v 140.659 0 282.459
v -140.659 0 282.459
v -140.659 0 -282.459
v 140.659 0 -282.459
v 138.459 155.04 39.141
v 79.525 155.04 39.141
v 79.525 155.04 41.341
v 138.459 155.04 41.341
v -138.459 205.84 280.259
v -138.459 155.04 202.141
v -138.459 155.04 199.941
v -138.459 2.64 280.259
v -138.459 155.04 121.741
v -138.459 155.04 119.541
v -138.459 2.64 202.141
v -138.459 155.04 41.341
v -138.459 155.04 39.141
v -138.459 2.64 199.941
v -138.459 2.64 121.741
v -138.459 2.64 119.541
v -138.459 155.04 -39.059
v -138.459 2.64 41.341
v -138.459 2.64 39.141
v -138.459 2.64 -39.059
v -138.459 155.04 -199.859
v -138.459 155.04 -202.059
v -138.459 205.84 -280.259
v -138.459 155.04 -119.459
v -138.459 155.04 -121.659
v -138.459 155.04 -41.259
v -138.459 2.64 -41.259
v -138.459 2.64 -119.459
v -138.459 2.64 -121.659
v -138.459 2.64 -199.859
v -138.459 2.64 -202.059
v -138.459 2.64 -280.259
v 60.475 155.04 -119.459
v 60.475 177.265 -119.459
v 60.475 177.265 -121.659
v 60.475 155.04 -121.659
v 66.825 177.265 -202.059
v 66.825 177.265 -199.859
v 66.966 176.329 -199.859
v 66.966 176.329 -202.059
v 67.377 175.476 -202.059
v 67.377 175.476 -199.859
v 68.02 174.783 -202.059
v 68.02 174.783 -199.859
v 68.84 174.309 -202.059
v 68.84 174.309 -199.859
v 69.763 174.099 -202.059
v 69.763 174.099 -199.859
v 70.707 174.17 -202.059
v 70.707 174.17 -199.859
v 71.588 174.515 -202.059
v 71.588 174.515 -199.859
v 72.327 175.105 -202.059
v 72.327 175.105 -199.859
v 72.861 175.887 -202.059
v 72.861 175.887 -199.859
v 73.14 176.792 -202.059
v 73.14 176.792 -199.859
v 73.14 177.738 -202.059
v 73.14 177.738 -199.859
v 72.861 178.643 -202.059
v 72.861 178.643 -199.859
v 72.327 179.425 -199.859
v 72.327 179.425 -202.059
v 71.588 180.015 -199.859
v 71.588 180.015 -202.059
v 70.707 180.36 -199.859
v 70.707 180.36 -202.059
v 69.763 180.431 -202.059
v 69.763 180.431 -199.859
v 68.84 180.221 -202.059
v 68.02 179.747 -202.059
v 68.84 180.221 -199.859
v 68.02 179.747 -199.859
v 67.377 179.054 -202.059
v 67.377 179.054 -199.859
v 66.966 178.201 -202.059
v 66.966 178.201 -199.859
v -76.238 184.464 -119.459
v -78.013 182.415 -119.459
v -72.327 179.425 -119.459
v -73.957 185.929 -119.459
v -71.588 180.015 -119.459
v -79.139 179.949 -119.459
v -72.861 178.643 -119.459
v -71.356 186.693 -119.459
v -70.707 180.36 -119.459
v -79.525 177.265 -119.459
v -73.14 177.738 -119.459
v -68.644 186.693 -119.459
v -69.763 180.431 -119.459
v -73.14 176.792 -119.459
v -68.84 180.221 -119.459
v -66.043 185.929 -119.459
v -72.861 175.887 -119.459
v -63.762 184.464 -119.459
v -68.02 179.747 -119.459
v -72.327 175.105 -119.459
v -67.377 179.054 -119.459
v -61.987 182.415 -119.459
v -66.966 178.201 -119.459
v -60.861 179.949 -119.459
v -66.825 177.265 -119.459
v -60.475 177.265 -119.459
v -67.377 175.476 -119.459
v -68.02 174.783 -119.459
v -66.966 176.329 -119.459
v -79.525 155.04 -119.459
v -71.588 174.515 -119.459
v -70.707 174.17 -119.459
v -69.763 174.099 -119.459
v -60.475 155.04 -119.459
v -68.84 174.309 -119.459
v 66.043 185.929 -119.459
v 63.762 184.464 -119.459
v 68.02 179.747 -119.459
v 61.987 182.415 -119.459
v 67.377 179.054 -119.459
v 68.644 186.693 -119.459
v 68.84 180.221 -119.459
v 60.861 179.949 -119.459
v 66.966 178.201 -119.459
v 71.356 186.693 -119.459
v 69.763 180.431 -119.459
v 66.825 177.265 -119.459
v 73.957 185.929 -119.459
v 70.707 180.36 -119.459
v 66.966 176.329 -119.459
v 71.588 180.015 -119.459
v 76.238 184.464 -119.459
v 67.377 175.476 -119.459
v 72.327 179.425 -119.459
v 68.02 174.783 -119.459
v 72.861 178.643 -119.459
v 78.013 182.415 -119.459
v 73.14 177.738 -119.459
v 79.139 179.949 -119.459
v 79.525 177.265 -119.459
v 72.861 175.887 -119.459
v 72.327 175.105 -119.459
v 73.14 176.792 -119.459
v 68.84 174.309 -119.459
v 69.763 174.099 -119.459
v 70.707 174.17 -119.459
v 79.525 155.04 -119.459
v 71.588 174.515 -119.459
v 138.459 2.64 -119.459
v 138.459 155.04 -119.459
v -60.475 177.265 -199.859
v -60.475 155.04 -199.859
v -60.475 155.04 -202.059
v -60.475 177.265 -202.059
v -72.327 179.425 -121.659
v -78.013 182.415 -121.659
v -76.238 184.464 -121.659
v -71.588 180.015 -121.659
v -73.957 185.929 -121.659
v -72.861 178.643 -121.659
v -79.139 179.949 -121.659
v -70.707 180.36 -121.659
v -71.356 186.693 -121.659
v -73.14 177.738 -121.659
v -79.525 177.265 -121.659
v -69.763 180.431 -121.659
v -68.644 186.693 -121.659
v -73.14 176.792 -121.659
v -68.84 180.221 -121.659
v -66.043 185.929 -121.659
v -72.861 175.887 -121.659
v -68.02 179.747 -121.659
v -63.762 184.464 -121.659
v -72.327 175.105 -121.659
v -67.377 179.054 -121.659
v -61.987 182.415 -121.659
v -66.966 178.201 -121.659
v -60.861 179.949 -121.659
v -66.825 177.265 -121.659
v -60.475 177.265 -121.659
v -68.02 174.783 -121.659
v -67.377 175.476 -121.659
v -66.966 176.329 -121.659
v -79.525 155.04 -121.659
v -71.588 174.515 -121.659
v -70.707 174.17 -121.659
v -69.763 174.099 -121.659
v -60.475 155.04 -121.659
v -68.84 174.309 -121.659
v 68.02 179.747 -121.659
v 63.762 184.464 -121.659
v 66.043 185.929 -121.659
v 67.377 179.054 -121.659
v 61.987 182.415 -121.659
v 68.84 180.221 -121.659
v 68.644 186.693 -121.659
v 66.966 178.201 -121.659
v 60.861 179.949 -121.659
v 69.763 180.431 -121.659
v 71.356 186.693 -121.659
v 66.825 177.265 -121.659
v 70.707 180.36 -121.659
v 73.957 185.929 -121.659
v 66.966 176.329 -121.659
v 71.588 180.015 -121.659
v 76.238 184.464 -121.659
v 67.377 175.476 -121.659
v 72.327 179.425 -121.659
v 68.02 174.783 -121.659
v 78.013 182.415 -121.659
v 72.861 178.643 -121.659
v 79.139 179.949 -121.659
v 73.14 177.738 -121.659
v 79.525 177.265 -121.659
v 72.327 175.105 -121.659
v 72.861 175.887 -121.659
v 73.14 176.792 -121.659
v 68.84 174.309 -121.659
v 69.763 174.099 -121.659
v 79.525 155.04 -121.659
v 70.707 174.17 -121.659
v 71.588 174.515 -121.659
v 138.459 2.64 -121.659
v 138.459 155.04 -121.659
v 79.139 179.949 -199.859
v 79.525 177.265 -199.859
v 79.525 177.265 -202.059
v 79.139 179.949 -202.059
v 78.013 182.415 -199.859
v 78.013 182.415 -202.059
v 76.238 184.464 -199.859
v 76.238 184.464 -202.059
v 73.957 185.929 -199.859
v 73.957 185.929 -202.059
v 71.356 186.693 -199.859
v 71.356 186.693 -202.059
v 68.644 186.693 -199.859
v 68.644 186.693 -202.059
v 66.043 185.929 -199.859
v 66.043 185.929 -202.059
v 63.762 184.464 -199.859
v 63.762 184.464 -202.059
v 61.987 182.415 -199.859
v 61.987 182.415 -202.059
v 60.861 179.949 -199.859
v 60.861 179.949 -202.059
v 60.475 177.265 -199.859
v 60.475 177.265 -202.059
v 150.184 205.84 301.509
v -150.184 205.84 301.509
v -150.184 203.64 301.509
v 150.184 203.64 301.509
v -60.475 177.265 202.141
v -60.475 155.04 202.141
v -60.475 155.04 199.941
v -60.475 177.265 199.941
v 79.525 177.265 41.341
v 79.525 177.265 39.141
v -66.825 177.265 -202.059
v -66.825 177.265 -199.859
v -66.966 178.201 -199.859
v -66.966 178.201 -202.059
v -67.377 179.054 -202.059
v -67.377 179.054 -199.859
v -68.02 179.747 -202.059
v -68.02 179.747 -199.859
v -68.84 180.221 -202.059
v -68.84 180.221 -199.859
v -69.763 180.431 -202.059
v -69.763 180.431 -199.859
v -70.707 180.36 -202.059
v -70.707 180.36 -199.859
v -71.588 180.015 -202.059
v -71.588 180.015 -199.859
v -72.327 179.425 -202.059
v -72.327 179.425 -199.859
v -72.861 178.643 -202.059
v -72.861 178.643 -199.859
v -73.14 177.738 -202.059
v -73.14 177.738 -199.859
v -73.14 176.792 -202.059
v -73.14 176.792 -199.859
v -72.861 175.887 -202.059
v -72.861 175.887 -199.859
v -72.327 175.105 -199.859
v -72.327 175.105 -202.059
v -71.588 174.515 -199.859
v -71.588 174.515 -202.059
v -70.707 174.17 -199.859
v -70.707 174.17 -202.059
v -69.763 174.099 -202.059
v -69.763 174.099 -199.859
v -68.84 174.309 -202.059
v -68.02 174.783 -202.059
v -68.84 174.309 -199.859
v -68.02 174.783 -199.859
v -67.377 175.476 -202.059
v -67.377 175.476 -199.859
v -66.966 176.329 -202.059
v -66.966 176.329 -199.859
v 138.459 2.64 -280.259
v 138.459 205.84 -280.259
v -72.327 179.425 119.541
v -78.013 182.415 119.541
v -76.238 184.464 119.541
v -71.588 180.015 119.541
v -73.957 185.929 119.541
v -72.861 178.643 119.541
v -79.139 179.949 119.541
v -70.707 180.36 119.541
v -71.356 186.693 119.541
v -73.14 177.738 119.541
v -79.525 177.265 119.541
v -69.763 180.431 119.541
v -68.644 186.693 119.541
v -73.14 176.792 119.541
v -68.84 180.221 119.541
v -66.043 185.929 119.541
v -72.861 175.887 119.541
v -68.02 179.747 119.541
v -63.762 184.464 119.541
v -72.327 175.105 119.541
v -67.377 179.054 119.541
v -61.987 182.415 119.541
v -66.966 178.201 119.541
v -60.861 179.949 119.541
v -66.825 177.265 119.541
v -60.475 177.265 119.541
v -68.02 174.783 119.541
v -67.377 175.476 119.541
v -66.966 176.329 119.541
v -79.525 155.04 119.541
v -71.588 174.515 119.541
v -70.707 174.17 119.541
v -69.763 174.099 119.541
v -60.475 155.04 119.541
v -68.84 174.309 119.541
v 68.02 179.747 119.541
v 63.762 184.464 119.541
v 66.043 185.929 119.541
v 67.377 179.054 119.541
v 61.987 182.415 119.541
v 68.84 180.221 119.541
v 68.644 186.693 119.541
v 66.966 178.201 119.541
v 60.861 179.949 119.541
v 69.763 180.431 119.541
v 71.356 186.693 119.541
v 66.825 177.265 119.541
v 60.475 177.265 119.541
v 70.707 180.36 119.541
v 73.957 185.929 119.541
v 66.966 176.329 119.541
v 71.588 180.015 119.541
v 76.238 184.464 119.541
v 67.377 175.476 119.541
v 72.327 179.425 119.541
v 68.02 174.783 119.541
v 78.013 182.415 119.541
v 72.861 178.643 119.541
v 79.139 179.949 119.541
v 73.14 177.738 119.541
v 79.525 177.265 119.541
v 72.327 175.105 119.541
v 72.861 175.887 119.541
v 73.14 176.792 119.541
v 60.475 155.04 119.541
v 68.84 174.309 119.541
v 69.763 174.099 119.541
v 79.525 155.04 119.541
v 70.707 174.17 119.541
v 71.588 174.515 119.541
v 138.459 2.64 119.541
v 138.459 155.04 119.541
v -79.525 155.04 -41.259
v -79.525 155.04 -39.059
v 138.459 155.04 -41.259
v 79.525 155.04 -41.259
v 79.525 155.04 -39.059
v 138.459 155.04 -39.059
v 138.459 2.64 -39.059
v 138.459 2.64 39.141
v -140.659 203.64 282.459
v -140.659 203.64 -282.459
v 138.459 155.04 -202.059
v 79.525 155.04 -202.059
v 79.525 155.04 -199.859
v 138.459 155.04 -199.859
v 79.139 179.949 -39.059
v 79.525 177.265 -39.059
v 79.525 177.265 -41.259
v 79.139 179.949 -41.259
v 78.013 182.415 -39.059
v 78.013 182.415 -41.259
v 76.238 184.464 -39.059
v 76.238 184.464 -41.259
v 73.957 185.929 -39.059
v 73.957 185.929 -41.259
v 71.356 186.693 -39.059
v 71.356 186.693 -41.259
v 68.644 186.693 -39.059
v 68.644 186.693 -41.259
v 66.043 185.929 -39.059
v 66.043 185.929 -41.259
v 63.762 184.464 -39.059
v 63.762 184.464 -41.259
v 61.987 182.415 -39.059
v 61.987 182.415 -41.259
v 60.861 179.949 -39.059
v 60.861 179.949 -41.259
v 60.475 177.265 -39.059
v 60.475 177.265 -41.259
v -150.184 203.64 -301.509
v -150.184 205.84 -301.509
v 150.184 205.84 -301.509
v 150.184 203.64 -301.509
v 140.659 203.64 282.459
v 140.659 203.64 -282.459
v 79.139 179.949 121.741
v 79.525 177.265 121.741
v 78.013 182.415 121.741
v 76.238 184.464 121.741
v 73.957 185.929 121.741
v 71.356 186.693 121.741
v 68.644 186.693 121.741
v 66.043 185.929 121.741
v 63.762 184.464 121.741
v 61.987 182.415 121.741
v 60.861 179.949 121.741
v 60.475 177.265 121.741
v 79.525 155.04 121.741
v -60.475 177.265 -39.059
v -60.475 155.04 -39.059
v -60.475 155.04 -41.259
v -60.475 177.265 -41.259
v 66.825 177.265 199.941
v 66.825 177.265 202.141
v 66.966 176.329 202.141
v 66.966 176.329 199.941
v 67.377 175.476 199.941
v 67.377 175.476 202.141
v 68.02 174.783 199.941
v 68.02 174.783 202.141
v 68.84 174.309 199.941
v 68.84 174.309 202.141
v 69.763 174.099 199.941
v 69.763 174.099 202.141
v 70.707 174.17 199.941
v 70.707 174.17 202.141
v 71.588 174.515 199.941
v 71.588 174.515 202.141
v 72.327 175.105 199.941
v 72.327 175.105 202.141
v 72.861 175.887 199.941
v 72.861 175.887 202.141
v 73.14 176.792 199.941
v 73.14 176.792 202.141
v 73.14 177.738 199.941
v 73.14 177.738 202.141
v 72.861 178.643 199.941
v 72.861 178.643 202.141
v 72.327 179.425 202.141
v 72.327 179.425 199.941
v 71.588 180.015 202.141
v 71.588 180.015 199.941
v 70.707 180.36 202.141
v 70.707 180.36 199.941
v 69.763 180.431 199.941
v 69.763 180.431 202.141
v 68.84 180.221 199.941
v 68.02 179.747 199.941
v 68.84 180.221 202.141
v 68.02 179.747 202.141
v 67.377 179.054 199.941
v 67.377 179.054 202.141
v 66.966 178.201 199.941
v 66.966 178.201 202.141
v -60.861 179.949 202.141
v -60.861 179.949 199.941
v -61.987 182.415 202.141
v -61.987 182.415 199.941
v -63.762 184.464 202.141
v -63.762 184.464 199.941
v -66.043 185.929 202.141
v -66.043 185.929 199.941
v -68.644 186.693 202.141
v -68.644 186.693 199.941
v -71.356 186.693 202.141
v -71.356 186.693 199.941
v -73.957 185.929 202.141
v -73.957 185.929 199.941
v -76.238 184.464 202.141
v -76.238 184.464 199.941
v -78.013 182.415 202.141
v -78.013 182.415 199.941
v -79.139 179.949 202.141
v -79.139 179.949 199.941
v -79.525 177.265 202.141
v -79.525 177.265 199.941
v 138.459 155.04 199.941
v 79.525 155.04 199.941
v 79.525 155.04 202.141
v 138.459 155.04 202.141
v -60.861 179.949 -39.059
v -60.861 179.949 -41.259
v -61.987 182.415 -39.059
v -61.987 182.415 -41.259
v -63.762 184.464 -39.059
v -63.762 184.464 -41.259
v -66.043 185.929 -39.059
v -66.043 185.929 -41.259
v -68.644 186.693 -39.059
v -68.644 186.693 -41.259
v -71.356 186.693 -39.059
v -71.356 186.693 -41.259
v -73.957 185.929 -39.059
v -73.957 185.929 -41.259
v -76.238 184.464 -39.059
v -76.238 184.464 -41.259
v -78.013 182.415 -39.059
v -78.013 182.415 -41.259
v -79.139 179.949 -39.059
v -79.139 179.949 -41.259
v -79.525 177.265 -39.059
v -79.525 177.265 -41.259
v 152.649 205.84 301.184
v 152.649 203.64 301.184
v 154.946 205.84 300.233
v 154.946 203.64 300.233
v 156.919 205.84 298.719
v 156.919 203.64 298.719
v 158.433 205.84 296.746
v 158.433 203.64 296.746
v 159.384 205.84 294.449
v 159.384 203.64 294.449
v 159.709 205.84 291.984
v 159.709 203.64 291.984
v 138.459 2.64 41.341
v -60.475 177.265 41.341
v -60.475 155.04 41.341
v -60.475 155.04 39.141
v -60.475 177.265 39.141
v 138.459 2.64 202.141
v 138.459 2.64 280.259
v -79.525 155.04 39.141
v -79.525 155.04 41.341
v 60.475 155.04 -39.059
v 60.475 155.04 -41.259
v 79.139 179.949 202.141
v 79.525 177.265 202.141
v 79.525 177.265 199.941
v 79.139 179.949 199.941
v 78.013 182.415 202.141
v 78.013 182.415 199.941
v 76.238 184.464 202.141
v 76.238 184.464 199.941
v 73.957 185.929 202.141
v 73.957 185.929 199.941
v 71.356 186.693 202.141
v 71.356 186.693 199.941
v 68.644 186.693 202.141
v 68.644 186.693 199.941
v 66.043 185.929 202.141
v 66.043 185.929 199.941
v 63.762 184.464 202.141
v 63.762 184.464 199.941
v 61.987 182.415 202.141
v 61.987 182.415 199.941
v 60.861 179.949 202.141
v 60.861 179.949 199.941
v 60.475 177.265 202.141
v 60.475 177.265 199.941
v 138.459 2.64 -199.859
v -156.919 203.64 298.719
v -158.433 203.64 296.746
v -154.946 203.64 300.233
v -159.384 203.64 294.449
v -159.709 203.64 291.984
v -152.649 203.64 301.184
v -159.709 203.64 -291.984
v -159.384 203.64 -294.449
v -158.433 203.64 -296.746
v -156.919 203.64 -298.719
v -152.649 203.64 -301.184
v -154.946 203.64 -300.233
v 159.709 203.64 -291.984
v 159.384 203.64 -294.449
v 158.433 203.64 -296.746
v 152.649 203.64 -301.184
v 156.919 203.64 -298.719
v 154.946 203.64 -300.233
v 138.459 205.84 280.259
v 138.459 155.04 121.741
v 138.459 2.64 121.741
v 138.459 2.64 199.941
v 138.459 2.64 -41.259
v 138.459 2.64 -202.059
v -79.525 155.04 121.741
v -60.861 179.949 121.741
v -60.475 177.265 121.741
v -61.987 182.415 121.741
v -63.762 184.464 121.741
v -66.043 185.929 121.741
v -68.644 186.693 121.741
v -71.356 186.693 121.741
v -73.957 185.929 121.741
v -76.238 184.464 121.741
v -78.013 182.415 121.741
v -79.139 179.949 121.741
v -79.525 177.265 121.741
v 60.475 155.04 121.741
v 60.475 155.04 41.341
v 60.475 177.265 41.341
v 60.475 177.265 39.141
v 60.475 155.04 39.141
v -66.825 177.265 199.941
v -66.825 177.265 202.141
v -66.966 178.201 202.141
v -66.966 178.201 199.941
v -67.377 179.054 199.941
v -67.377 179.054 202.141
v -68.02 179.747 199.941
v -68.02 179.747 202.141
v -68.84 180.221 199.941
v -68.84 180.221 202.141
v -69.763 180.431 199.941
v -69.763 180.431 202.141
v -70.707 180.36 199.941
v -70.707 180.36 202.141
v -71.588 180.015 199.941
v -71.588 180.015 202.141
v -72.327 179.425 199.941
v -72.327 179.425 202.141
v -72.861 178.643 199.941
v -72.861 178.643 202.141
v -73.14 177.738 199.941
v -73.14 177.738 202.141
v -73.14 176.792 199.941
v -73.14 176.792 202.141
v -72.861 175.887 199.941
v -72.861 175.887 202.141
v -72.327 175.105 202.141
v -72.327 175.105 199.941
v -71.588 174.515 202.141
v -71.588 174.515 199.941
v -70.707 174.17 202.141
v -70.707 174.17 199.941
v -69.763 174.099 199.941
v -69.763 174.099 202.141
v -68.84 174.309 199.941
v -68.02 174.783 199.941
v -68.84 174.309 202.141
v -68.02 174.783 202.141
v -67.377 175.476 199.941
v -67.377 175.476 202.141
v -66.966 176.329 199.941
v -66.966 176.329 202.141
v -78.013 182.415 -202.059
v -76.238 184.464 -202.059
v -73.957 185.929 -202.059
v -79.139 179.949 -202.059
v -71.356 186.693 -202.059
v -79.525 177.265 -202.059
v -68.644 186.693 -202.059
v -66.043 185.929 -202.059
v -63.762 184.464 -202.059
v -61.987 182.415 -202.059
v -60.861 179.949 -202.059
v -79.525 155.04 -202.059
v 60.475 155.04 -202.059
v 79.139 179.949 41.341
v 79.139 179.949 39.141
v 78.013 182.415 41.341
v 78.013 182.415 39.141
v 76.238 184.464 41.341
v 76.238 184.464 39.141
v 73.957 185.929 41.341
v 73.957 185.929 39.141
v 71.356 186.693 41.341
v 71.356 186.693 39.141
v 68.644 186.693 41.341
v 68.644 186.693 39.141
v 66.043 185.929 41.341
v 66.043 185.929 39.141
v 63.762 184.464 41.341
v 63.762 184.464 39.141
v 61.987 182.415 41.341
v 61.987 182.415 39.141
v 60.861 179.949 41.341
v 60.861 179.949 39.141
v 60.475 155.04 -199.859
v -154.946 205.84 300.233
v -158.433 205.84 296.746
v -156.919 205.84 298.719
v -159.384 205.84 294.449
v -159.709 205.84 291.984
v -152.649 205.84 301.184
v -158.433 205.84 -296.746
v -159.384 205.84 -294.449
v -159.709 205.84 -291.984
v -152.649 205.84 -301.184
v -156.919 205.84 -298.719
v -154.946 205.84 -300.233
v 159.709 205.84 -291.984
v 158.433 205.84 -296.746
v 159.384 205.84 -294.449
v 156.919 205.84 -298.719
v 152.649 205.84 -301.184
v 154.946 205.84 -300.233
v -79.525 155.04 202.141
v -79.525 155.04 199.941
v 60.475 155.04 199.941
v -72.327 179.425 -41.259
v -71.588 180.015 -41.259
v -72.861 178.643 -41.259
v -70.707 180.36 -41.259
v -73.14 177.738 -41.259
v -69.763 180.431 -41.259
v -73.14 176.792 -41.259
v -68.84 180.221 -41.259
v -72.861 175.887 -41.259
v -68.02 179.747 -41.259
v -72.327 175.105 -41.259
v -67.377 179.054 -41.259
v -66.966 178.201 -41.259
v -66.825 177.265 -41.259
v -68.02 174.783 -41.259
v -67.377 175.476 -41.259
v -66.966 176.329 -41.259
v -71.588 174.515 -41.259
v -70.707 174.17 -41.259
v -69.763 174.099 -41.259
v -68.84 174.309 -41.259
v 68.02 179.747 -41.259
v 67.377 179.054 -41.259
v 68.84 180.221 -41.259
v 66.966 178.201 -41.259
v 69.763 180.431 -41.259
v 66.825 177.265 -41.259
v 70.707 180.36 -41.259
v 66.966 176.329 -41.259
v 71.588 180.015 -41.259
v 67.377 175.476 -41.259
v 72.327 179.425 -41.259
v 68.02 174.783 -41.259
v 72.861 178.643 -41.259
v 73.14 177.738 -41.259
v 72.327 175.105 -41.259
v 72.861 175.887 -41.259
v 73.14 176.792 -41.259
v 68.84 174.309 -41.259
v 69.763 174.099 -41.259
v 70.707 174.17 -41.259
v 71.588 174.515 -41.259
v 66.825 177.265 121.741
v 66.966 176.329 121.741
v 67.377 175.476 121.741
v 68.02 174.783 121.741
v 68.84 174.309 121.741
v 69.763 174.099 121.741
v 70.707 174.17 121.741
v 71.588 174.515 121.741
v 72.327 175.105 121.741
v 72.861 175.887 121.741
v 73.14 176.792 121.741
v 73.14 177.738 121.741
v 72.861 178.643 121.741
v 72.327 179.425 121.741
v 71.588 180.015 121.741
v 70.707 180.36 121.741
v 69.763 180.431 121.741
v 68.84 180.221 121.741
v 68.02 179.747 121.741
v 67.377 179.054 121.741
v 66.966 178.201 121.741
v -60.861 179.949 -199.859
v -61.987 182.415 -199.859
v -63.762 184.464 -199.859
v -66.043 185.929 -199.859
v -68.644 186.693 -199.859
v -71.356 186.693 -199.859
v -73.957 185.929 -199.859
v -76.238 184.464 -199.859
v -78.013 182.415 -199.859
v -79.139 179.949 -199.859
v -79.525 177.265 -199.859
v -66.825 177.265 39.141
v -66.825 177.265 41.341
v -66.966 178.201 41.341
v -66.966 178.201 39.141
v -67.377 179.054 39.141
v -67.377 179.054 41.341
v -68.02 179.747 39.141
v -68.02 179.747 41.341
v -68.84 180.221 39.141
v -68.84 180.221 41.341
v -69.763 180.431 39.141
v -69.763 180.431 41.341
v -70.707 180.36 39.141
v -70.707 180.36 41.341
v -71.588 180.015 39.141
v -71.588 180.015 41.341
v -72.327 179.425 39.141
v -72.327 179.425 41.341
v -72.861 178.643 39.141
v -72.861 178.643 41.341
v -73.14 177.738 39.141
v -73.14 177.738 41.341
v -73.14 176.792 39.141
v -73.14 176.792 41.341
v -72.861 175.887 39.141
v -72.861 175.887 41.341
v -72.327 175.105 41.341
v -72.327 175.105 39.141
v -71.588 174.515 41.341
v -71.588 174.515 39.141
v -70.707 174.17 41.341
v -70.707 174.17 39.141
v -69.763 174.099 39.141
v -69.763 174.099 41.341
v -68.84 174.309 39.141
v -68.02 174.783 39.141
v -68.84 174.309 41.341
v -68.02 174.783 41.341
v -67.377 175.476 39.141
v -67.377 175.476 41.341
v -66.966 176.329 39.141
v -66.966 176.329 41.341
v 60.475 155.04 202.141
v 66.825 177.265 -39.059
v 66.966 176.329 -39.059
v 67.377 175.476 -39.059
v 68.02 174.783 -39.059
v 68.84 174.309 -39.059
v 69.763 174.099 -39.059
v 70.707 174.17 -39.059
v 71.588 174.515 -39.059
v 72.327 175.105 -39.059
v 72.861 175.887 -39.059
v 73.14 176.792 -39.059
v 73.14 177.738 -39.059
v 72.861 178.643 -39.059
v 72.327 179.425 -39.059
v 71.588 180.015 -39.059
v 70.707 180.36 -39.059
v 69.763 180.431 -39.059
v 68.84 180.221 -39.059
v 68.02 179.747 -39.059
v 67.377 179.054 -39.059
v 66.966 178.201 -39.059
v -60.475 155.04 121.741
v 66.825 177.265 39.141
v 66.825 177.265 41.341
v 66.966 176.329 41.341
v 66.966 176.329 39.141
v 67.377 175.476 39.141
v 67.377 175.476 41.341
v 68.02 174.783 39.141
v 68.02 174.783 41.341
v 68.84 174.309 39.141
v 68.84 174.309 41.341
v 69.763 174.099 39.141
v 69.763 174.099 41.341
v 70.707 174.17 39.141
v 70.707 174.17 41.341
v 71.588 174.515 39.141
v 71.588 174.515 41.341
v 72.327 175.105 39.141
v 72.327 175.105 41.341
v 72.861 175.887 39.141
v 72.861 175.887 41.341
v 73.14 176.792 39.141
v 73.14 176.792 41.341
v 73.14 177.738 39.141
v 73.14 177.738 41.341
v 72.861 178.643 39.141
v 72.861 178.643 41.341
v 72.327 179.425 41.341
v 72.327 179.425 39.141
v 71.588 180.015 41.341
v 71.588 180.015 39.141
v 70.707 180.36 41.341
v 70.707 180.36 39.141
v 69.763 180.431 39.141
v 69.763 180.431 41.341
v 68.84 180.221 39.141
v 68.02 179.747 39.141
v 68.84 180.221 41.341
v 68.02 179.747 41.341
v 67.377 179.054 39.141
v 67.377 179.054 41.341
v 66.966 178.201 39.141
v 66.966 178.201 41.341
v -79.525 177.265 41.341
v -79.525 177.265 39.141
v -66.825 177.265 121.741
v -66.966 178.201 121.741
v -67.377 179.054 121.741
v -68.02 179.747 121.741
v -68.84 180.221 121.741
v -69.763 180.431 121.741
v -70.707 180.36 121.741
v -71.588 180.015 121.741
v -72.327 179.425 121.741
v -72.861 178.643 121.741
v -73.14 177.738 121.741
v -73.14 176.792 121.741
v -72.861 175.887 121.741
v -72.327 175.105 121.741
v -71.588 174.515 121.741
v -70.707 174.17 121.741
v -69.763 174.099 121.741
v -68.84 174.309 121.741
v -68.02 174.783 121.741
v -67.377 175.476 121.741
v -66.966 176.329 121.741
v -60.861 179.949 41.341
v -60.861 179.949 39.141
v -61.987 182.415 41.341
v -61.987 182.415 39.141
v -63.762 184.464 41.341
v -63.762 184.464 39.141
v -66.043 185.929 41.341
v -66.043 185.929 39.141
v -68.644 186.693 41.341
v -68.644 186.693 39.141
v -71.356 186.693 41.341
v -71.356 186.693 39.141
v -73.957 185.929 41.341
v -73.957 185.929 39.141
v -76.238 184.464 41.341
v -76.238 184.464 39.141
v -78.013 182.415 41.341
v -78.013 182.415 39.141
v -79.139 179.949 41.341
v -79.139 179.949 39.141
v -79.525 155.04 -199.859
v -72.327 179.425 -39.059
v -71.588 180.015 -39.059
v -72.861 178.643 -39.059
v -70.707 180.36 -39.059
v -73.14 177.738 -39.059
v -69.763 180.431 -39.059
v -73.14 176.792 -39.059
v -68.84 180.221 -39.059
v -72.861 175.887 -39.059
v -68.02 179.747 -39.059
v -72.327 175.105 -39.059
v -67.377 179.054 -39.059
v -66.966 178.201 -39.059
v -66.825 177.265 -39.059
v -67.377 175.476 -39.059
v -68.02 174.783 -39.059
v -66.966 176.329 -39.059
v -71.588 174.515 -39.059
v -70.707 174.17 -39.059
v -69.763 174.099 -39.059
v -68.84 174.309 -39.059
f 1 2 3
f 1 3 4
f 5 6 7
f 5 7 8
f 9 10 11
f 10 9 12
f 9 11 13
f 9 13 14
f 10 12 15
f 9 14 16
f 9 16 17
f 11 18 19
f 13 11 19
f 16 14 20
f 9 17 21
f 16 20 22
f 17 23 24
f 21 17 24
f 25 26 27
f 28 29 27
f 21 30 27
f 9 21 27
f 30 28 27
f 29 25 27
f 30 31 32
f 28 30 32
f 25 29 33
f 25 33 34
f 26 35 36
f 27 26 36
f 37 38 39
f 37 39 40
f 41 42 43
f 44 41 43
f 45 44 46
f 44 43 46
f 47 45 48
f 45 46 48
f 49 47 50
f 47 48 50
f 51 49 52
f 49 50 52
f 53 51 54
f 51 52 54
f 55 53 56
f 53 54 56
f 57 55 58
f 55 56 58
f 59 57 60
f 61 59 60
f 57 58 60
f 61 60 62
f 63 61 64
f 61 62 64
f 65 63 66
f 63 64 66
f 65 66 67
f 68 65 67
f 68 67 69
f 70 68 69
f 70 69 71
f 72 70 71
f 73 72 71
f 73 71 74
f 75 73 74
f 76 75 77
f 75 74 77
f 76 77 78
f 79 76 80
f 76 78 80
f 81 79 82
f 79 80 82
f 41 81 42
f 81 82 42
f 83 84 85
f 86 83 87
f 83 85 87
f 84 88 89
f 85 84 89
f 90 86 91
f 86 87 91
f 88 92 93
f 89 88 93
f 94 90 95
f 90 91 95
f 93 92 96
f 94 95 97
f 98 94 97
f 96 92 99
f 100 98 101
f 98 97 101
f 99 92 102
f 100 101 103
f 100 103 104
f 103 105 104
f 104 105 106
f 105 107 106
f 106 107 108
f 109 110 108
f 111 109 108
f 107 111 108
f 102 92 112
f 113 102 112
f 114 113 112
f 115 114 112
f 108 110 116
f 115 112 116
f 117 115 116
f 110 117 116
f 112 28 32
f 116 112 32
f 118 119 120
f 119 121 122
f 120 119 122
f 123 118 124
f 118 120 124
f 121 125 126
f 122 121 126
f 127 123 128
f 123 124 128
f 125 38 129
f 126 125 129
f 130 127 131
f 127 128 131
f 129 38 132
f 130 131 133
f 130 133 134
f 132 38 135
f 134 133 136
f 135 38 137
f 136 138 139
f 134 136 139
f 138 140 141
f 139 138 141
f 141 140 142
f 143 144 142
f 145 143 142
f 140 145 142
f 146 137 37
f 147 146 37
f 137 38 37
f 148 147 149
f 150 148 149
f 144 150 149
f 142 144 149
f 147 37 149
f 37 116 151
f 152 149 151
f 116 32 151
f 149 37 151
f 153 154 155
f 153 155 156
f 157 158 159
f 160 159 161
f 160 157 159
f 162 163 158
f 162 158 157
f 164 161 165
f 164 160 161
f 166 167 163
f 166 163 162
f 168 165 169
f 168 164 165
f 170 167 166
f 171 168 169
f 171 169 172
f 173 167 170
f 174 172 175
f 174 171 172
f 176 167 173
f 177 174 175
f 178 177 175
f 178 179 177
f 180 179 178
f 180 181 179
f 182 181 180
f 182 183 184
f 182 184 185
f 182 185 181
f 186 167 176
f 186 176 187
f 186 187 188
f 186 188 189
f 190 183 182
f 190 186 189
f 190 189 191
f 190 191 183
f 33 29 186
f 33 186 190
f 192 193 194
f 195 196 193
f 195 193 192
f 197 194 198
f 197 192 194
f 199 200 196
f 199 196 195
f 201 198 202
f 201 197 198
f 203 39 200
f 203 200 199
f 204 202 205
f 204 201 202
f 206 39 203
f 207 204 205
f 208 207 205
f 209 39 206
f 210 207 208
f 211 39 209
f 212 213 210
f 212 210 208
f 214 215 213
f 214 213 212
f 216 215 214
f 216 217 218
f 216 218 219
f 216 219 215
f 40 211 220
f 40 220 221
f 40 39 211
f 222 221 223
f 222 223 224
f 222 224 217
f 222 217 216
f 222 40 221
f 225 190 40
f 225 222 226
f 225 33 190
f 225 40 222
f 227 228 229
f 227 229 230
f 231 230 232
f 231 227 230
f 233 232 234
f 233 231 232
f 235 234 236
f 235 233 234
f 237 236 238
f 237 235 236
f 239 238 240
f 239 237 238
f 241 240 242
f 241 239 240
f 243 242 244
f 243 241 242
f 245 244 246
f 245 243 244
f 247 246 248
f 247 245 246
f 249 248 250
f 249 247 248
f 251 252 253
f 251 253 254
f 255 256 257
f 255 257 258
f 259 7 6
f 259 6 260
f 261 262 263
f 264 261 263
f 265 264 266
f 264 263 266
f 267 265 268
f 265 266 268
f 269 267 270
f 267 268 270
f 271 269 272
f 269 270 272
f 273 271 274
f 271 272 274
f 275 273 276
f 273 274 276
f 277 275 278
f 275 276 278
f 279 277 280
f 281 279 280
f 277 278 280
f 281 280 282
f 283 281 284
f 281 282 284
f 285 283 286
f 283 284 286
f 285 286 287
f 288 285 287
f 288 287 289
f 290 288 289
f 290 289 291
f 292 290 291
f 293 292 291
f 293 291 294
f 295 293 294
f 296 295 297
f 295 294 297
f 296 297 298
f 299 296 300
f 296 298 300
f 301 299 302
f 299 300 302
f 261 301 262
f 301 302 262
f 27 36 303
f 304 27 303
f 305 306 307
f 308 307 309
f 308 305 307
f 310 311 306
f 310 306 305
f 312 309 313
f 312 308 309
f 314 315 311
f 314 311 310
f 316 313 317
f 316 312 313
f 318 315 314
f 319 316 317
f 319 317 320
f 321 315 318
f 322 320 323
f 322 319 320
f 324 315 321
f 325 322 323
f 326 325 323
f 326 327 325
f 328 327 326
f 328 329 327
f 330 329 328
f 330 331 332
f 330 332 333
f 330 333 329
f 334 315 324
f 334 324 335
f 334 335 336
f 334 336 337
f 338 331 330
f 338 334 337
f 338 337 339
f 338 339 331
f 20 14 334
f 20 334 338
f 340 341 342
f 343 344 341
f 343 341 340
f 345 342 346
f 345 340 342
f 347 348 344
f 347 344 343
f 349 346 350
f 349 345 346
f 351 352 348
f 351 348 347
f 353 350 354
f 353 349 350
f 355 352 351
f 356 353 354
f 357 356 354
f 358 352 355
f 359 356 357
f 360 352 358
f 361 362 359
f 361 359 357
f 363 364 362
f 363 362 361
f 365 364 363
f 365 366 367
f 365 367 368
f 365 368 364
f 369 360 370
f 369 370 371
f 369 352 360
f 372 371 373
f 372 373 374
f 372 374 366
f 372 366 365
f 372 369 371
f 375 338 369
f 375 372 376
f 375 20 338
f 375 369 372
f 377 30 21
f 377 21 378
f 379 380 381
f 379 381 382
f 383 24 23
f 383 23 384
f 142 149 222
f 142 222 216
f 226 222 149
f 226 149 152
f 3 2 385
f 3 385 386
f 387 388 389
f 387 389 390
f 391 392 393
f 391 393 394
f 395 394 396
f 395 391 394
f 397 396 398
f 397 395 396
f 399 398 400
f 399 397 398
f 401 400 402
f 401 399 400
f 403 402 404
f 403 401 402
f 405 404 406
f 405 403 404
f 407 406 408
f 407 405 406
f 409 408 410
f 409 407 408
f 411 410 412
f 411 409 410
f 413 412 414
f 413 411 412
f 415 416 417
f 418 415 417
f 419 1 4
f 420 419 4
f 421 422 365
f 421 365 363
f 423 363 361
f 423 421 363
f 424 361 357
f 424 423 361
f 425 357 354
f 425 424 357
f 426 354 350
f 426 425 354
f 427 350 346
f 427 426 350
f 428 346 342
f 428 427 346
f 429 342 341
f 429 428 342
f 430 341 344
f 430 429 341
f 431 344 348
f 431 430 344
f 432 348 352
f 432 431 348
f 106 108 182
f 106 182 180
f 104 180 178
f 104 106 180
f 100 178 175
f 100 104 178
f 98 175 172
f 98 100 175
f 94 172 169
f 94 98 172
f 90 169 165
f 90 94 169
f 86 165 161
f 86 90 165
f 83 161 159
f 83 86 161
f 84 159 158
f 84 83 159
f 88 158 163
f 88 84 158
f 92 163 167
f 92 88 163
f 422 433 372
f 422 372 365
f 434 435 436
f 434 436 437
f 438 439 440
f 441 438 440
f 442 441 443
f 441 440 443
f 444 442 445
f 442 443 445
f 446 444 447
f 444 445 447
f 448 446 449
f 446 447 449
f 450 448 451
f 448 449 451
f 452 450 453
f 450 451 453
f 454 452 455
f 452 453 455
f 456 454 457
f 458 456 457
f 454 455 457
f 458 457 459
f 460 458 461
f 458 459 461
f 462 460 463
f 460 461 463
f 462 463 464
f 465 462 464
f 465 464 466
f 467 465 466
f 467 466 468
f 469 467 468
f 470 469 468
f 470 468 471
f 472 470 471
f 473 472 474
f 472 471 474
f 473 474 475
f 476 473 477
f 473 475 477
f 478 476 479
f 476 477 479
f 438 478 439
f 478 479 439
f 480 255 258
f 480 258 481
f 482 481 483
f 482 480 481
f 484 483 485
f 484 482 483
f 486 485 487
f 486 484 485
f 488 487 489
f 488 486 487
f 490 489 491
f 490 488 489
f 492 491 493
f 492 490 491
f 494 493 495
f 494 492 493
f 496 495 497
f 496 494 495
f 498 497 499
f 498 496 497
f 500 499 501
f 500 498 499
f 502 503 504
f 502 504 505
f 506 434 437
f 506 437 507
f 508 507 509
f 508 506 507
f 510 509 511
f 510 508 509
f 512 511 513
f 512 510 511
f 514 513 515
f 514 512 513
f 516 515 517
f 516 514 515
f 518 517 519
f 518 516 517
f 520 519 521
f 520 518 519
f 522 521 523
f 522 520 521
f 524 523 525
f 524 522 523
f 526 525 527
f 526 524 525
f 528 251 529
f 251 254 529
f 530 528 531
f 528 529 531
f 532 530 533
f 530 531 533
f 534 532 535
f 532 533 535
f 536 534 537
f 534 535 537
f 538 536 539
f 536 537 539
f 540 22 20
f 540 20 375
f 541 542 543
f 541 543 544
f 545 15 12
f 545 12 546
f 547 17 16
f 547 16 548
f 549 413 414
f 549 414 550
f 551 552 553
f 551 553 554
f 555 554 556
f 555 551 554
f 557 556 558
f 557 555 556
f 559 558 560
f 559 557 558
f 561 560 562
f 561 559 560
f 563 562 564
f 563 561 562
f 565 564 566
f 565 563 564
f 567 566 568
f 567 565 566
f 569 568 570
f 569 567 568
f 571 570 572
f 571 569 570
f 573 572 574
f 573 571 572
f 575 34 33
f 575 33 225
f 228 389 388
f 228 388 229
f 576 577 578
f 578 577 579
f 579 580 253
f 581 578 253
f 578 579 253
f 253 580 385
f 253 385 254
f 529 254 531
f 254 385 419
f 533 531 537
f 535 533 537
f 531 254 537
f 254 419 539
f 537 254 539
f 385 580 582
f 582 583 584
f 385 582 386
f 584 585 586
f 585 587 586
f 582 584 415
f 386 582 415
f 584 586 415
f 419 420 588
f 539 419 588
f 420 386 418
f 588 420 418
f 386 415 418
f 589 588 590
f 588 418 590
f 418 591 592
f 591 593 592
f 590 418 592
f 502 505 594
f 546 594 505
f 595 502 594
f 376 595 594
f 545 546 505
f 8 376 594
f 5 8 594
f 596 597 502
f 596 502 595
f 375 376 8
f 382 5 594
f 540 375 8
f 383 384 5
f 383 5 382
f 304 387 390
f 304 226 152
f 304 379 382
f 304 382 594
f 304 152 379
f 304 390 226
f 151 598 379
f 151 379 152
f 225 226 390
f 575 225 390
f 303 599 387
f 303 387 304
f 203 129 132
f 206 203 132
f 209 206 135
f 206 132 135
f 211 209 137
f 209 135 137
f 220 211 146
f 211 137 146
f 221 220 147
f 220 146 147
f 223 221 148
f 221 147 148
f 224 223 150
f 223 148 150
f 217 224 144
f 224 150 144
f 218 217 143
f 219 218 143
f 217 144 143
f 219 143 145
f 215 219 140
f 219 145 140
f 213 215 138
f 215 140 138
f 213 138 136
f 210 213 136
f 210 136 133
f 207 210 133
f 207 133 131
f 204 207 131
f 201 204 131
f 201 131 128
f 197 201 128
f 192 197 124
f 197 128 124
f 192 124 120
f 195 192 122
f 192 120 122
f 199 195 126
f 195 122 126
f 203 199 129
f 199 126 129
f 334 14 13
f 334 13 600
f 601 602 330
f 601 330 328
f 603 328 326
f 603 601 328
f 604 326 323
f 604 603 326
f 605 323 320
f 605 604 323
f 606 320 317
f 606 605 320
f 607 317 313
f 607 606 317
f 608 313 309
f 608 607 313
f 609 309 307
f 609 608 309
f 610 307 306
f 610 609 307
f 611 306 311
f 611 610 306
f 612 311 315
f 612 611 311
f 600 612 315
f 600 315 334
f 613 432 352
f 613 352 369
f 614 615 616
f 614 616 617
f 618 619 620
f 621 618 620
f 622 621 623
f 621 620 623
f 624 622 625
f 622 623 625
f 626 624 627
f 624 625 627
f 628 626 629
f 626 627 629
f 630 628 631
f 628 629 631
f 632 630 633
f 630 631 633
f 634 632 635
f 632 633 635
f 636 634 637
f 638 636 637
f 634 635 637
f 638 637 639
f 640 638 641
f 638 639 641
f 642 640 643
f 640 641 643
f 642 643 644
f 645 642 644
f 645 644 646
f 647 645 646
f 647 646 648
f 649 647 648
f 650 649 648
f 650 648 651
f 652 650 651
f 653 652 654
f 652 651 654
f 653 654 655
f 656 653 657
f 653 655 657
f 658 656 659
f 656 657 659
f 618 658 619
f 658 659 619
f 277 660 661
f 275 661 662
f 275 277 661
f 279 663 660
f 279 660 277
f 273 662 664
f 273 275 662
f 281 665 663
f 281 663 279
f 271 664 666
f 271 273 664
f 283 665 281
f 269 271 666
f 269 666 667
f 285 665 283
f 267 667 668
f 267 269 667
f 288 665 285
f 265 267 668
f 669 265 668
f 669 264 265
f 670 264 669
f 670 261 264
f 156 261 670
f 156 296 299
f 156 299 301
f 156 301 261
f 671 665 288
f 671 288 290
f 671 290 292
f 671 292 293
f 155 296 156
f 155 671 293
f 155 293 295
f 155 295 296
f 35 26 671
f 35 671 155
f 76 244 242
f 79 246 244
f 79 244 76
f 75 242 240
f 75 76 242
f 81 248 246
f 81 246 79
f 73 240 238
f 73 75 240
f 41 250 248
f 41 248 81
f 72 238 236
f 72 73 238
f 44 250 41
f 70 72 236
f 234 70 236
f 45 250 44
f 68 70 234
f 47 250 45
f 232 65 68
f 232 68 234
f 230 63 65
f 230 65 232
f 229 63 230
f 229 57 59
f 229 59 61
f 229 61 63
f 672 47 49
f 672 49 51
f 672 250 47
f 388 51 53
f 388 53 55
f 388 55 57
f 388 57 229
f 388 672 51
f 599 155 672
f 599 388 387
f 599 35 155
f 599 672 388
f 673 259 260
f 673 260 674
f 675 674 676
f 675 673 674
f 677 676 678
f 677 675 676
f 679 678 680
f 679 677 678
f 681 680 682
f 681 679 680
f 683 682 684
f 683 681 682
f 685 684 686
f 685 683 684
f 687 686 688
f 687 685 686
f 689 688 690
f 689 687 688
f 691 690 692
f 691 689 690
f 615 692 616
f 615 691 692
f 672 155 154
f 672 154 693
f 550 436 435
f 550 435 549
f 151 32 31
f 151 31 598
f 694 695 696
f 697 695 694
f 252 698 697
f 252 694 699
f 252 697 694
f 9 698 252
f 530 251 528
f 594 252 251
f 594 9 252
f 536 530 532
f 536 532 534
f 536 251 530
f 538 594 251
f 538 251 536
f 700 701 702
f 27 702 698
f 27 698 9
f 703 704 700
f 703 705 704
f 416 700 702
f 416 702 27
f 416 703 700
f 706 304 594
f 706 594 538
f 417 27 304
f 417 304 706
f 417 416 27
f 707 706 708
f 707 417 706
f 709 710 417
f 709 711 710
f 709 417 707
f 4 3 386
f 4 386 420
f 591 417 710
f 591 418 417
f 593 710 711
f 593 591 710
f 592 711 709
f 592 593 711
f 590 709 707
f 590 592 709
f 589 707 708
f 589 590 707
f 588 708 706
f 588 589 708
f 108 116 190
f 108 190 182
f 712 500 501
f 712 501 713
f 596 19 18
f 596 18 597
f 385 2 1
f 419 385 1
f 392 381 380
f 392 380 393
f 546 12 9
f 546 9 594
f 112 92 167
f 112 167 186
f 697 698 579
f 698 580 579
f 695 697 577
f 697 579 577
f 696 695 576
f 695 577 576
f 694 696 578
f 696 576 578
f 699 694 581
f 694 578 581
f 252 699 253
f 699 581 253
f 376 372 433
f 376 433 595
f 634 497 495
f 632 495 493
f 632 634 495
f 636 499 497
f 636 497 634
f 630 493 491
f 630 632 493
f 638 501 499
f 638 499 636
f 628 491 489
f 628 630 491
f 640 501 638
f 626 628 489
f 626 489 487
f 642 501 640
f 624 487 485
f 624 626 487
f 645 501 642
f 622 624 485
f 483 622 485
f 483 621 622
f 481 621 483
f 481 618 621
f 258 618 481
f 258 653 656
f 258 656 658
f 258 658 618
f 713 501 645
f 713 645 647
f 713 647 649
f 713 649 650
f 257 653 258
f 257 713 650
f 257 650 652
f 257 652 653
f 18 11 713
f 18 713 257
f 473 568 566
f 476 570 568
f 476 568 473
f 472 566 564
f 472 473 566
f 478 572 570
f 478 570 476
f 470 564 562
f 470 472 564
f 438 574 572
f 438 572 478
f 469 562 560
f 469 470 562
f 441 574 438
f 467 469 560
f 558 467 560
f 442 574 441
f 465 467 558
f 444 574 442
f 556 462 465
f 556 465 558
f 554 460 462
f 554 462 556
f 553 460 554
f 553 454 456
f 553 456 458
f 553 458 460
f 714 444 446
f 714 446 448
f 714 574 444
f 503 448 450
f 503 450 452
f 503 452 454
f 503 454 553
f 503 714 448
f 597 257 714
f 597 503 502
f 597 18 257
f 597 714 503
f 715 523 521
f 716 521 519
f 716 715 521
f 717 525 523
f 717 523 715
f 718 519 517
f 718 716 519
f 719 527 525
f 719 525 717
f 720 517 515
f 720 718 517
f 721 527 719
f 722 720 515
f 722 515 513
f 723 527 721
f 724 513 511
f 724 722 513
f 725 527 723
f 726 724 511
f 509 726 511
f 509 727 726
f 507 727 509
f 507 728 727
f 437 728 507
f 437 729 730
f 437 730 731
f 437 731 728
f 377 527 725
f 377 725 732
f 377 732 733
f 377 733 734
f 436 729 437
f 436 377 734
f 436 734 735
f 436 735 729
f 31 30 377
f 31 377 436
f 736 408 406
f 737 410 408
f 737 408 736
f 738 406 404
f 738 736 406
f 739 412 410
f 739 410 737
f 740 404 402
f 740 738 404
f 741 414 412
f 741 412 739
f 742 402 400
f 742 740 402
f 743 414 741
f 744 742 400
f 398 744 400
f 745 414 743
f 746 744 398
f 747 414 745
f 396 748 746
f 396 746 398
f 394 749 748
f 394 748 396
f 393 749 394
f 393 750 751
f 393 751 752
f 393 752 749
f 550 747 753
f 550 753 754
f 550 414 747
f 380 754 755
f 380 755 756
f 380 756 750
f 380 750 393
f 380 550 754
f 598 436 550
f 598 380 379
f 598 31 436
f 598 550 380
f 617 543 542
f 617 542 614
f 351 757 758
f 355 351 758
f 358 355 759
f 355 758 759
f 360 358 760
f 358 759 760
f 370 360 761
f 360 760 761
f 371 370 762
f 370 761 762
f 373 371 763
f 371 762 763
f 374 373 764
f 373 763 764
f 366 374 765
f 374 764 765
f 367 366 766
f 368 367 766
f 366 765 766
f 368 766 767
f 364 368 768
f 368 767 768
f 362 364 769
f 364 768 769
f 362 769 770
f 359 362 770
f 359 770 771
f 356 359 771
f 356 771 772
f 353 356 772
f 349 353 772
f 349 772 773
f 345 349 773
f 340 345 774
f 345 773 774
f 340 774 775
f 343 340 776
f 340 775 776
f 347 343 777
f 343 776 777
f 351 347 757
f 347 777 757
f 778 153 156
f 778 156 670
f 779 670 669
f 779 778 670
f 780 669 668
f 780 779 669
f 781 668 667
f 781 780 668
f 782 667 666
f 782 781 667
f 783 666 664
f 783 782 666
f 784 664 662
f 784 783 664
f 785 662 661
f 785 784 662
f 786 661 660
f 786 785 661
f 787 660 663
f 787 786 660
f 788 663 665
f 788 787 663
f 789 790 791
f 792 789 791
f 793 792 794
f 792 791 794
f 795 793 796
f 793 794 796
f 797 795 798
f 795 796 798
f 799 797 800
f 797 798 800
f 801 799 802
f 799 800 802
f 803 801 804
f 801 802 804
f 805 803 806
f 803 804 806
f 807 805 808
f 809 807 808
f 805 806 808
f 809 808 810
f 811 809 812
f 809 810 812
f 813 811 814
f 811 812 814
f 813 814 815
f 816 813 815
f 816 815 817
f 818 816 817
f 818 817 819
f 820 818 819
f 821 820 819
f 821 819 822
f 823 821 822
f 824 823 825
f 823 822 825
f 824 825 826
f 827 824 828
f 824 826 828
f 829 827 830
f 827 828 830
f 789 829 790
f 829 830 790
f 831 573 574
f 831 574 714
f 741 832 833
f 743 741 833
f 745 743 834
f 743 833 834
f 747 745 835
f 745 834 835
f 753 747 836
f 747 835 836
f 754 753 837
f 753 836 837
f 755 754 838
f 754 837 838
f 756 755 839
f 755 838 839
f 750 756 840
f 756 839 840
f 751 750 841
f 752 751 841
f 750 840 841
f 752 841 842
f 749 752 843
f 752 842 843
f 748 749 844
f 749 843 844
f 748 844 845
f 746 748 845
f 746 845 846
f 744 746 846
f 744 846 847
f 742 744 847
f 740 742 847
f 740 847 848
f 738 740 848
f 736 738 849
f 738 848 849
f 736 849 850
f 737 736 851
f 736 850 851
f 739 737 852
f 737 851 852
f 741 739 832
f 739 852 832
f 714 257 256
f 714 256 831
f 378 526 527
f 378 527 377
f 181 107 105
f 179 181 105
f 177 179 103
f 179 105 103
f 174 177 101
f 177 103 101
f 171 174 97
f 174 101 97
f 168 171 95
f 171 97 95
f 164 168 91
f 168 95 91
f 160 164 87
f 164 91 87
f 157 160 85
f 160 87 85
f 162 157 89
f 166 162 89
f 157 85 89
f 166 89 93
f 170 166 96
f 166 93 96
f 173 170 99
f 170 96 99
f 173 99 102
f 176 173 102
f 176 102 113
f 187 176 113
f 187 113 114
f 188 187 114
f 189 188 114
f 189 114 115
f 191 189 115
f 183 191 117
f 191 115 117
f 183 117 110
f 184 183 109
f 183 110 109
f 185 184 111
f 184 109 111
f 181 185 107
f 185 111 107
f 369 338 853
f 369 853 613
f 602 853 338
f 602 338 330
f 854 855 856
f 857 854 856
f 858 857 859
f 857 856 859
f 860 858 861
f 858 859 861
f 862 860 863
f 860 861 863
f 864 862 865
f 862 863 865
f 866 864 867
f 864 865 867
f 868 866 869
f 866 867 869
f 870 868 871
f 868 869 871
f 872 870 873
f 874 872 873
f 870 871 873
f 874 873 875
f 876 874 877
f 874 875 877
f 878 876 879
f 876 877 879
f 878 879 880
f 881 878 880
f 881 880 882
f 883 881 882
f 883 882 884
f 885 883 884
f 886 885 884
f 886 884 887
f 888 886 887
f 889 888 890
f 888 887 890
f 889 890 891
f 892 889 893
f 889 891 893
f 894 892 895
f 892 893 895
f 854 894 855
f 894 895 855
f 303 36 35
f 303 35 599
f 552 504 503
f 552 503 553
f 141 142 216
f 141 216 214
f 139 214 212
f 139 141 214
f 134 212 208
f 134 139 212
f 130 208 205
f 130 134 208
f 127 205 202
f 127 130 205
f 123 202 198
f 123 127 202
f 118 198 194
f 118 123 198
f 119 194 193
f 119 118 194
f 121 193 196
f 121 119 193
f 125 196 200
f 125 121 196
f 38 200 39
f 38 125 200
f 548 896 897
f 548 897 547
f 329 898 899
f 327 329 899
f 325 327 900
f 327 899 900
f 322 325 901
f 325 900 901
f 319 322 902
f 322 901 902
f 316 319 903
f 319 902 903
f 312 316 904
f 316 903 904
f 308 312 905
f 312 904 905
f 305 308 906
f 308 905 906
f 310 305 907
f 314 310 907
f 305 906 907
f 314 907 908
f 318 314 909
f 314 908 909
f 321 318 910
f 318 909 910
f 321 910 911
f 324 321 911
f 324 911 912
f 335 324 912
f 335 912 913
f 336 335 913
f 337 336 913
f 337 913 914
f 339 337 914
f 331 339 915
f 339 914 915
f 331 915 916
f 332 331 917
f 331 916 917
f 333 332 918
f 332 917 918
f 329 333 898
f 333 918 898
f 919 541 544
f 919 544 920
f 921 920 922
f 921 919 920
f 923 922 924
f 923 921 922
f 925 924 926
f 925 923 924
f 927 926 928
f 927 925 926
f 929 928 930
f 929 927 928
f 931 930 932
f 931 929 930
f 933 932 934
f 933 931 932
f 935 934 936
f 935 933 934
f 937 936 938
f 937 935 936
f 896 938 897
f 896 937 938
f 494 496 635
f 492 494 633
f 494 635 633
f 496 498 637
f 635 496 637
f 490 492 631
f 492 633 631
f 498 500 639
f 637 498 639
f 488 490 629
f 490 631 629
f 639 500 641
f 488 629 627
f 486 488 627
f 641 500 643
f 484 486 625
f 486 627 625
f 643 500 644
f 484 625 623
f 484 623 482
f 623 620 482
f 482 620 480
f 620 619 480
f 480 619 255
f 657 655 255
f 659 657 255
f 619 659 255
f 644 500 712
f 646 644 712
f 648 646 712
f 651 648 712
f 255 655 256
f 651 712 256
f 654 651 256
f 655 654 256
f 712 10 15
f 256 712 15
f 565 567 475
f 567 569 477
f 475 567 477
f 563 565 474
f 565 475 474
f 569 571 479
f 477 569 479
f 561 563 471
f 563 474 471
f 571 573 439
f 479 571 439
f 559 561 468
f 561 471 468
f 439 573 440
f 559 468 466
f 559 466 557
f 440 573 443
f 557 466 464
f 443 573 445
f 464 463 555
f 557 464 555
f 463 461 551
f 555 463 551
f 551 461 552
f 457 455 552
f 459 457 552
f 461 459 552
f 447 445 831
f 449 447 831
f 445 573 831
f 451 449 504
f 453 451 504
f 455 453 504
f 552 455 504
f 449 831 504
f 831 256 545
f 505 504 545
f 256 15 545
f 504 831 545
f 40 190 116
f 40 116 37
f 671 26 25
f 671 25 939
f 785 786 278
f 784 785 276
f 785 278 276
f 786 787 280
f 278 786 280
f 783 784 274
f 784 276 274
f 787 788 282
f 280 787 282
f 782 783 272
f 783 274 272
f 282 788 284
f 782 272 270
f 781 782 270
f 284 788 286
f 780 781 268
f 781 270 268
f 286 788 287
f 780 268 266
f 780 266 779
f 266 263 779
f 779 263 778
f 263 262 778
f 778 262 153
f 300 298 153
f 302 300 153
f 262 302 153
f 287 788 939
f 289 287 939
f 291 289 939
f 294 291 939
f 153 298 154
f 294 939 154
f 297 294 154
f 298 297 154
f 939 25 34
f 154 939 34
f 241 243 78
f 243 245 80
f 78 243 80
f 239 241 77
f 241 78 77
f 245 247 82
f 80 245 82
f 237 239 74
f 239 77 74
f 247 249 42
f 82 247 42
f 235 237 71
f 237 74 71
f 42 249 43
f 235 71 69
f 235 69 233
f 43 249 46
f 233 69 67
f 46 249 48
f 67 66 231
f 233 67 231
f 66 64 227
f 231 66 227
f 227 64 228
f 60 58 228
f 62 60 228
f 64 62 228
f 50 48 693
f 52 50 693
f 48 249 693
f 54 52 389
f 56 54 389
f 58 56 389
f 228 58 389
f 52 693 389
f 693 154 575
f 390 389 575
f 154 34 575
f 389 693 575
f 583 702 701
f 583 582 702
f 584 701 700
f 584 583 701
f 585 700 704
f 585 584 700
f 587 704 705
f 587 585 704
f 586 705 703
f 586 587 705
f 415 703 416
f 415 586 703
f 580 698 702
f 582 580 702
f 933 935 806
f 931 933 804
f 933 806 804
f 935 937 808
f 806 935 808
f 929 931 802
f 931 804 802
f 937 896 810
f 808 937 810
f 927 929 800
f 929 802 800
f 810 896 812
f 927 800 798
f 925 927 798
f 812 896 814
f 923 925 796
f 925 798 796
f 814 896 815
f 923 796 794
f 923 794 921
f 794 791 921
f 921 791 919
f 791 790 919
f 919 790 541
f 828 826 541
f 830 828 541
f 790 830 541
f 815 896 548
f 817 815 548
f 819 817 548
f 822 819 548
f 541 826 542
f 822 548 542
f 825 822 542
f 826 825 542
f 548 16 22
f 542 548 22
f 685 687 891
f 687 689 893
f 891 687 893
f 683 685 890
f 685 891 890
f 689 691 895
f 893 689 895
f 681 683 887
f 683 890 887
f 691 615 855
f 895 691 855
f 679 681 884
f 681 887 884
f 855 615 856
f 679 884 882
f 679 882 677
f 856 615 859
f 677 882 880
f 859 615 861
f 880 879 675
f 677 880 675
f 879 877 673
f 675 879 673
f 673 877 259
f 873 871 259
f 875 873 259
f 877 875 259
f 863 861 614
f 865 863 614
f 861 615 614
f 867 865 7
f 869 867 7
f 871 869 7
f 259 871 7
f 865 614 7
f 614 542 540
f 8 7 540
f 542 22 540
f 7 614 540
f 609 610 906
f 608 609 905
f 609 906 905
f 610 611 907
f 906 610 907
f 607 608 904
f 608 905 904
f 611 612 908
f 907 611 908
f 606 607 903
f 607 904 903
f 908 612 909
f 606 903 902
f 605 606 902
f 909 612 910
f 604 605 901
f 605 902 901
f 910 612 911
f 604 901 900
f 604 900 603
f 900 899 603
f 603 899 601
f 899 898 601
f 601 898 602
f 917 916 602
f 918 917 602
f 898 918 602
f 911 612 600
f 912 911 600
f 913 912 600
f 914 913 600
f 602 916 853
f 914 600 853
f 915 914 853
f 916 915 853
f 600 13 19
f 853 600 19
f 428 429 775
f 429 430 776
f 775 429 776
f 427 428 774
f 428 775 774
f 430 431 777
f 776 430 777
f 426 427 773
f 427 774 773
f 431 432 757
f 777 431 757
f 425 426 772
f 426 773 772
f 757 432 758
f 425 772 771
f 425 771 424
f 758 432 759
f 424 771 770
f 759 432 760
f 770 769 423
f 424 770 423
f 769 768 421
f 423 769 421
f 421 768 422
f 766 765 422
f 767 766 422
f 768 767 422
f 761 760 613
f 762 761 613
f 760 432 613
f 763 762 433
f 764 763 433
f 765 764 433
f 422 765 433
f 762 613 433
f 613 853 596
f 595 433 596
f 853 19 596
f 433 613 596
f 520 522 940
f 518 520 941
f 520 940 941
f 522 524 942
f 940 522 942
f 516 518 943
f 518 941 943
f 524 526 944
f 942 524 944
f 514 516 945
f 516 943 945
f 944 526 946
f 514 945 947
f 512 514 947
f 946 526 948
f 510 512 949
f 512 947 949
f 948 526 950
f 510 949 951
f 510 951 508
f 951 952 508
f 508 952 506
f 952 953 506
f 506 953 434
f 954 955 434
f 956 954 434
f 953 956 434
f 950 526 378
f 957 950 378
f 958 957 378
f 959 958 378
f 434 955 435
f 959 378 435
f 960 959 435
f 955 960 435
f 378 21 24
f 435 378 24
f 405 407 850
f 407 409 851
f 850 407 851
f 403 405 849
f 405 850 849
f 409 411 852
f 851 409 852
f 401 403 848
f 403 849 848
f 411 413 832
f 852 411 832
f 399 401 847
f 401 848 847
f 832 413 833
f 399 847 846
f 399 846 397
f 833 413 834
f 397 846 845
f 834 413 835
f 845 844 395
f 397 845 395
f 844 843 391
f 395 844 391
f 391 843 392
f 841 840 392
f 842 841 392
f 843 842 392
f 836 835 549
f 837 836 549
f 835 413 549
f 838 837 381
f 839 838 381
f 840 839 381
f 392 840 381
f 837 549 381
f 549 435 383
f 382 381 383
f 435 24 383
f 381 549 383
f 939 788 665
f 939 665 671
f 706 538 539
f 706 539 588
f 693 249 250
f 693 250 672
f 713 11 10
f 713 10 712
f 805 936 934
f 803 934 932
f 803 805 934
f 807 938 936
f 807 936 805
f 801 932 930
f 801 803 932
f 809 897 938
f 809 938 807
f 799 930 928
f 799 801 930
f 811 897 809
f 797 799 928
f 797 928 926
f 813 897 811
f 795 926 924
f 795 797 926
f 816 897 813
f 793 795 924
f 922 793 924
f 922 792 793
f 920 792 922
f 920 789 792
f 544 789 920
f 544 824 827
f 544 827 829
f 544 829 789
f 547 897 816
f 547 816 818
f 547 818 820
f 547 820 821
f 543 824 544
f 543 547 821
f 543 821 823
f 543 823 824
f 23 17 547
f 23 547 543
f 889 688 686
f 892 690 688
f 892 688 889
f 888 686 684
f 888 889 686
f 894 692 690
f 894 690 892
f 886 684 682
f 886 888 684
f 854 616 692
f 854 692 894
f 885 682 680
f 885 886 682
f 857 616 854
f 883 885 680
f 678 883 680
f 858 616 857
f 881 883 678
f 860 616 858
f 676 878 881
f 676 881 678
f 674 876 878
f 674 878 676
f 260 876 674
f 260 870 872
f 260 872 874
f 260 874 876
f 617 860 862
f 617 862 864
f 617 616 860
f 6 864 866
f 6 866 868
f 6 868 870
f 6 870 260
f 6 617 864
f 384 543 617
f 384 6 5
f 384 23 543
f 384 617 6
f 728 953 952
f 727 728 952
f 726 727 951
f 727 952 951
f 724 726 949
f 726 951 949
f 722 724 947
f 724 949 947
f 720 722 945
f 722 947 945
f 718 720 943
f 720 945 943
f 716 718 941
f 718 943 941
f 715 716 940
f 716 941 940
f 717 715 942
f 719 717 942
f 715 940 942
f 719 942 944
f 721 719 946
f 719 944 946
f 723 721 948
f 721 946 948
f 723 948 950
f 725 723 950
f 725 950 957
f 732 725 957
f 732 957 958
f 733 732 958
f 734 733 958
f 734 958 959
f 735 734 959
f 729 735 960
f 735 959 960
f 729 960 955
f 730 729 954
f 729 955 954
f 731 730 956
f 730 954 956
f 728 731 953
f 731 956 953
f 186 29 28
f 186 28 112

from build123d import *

# Parameters (mm, degrees)
SKETCH1_W           = 281.317999974
SKETCH1_H           = 564.917999956
BOSS_EXTRUDE1_DEPTH = 2.640000816
SKETCH2_W           = 281.317999974
SKETCH2_H           = 564.917999956
SKETCH2_W_2         = 276.918000138
SKETCH2_H_2         = 560.51800012
BOSS_EXTRUDE2_DEPTH = 203.2
SKETCH3_W           = 319.417999974
SKETCH3_H           = 603.017999956
SKETCH3_W_2         = 281.317999974
SKETCH3_H_2         = 564.917999956
BOSS_EXTRUDE3_DEPTH = 2.2
SKETCH5_W           = 276.918000138
SKETCH5_H           = 2.199999918
BOSS_EXTRUDE5_DEPTH = 152.4
SKETCH7_R           = 3.175
BOSS_EXTRUDE6_DEPTH = 2.2
LPATTERN1_COUNT     = 6
LPATTERN1_PITCH     = 80.399999982
FILLET4_R           = 9.525


with BuildPart() as part:
    # Sketch1 → Boss-Extrude1 (new body)
    with BuildSketch(Plane(origin=(0, 0, 0), x_dir=(1, 0, 0), z_dir=(0, 1, 0))):
        Rectangle(SKETCH1_W, SKETCH1_H)
    extrude(amount=BOSS_EXTRUDE1_DEPTH)

    # Sketch2 → Boss-Extrude2 (add)
    with BuildSketch(Plane(origin=(0, 2.640000816, 0), x_dir=(1, 0, 0), z_dir=(0, 1, 0))):
        Rectangle(SKETCH2_W, SKETCH2_H)
        Rectangle(SKETCH2_W_2, SKETCH2_H_2, mode=Mode.SUBTRACT)
    extrude(amount=BOSS_EXTRUDE2_DEPTH)

    # Sketch3 → Boss-Extrude3 (add)
    with BuildSketch(Plane(origin=(0, 205.840000816, 0), x_dir=(1, 0, 0), z_dir=(0, 1, 0))):
        Rectangle(SKETCH3_W, SKETCH3_H)
        Rectangle(SKETCH3_W_2, SKETCH3_H_2, mode=Mode.SUBTRACT)
    extrude(amount=-BOSS_EXTRUDE3_DEPTH)

    # Sketch5 → Boss-Extrude5 (add)
    with BuildSketch(Plane(origin=(0, 2.640000816, 0), x_dir=(1, 0, 0), z_dir=(0, 1, 0))):
        with Locations((0, 200.959000037)):
            Rectangle(SKETCH5_W, SKETCH5_H)
    boss_extrude5 = extrude(amount=BOSS_EXTRUDE5_DEPTH)

    # Sketch7 → Boss-Extrude6 (add)
    # profile 1 of 2: a face of its own
    with BuildSketch(Plane.XY.offset(-199.859000078)):
        with BuildLine():
            Line((-79.525, 155.040000816), (-60.475, 155.040000816))
            Line((-60.475, 155.040000816), (-60.475, 177.265000816))
            ThreePointArc((-60.475, 177.265000816), (-70, 186.790000816), (-79.525, 177.265000816))
            Line((-79.525, 177.265000816), (-79.525, 155.040000816))
        make_face()
        with Locations((-70, 177.265000816)):
            Circle(SKETCH7_R, mode=Mode.SUBTRACT)
    # profile 2 of 2: a face of its own
    with BuildSketch(Plane.XY.offset(-199.859000078)):
        with BuildLine():
            Line((79.525, 155.040000816), (79.525, 177.265000816))
            ThreePointArc((79.525, 177.265000816), (70, 186.790000816), (60.475, 177.265000816))
            Line((60.475, 177.265000816), (60.475, 155.040000816))
            Line((60.475, 155.040000816), (79.525, 155.040000816))
        make_face()
        with Locations((70, 177.265000816)):
            Circle(SKETCH7_R, mode=Mode.SUBTRACT)
    boss_extrude6 = extrude(amount=-BOSS_EXTRUDE6_DEPTH)

    # LPattern1: Boss-Extrude5, Boss-Extrude6 ×6
    with Locations(*[(0, 0, i * LPATTERN1_PITCH) for i in range(1, LPATTERN1_COUNT)]):
        add(boss_extrude5)
        add(boss_extrude6)

    # Fillet4
    fillet4_edges = [part.edges().sort_by_distance(p)[0] for p in [
        (-159.708999987, 204.740000816, 301.508999978),
        (-159.708999987, 204.740000816, -301.508999978),
        (159.708999987, 204.740000816, -301.508999978),
        (159.708999987, 204.740000816, 301.508999978),
    ]]
    fillet(fillet4_edges, radius=FILLET4_R)


solid = part.part
